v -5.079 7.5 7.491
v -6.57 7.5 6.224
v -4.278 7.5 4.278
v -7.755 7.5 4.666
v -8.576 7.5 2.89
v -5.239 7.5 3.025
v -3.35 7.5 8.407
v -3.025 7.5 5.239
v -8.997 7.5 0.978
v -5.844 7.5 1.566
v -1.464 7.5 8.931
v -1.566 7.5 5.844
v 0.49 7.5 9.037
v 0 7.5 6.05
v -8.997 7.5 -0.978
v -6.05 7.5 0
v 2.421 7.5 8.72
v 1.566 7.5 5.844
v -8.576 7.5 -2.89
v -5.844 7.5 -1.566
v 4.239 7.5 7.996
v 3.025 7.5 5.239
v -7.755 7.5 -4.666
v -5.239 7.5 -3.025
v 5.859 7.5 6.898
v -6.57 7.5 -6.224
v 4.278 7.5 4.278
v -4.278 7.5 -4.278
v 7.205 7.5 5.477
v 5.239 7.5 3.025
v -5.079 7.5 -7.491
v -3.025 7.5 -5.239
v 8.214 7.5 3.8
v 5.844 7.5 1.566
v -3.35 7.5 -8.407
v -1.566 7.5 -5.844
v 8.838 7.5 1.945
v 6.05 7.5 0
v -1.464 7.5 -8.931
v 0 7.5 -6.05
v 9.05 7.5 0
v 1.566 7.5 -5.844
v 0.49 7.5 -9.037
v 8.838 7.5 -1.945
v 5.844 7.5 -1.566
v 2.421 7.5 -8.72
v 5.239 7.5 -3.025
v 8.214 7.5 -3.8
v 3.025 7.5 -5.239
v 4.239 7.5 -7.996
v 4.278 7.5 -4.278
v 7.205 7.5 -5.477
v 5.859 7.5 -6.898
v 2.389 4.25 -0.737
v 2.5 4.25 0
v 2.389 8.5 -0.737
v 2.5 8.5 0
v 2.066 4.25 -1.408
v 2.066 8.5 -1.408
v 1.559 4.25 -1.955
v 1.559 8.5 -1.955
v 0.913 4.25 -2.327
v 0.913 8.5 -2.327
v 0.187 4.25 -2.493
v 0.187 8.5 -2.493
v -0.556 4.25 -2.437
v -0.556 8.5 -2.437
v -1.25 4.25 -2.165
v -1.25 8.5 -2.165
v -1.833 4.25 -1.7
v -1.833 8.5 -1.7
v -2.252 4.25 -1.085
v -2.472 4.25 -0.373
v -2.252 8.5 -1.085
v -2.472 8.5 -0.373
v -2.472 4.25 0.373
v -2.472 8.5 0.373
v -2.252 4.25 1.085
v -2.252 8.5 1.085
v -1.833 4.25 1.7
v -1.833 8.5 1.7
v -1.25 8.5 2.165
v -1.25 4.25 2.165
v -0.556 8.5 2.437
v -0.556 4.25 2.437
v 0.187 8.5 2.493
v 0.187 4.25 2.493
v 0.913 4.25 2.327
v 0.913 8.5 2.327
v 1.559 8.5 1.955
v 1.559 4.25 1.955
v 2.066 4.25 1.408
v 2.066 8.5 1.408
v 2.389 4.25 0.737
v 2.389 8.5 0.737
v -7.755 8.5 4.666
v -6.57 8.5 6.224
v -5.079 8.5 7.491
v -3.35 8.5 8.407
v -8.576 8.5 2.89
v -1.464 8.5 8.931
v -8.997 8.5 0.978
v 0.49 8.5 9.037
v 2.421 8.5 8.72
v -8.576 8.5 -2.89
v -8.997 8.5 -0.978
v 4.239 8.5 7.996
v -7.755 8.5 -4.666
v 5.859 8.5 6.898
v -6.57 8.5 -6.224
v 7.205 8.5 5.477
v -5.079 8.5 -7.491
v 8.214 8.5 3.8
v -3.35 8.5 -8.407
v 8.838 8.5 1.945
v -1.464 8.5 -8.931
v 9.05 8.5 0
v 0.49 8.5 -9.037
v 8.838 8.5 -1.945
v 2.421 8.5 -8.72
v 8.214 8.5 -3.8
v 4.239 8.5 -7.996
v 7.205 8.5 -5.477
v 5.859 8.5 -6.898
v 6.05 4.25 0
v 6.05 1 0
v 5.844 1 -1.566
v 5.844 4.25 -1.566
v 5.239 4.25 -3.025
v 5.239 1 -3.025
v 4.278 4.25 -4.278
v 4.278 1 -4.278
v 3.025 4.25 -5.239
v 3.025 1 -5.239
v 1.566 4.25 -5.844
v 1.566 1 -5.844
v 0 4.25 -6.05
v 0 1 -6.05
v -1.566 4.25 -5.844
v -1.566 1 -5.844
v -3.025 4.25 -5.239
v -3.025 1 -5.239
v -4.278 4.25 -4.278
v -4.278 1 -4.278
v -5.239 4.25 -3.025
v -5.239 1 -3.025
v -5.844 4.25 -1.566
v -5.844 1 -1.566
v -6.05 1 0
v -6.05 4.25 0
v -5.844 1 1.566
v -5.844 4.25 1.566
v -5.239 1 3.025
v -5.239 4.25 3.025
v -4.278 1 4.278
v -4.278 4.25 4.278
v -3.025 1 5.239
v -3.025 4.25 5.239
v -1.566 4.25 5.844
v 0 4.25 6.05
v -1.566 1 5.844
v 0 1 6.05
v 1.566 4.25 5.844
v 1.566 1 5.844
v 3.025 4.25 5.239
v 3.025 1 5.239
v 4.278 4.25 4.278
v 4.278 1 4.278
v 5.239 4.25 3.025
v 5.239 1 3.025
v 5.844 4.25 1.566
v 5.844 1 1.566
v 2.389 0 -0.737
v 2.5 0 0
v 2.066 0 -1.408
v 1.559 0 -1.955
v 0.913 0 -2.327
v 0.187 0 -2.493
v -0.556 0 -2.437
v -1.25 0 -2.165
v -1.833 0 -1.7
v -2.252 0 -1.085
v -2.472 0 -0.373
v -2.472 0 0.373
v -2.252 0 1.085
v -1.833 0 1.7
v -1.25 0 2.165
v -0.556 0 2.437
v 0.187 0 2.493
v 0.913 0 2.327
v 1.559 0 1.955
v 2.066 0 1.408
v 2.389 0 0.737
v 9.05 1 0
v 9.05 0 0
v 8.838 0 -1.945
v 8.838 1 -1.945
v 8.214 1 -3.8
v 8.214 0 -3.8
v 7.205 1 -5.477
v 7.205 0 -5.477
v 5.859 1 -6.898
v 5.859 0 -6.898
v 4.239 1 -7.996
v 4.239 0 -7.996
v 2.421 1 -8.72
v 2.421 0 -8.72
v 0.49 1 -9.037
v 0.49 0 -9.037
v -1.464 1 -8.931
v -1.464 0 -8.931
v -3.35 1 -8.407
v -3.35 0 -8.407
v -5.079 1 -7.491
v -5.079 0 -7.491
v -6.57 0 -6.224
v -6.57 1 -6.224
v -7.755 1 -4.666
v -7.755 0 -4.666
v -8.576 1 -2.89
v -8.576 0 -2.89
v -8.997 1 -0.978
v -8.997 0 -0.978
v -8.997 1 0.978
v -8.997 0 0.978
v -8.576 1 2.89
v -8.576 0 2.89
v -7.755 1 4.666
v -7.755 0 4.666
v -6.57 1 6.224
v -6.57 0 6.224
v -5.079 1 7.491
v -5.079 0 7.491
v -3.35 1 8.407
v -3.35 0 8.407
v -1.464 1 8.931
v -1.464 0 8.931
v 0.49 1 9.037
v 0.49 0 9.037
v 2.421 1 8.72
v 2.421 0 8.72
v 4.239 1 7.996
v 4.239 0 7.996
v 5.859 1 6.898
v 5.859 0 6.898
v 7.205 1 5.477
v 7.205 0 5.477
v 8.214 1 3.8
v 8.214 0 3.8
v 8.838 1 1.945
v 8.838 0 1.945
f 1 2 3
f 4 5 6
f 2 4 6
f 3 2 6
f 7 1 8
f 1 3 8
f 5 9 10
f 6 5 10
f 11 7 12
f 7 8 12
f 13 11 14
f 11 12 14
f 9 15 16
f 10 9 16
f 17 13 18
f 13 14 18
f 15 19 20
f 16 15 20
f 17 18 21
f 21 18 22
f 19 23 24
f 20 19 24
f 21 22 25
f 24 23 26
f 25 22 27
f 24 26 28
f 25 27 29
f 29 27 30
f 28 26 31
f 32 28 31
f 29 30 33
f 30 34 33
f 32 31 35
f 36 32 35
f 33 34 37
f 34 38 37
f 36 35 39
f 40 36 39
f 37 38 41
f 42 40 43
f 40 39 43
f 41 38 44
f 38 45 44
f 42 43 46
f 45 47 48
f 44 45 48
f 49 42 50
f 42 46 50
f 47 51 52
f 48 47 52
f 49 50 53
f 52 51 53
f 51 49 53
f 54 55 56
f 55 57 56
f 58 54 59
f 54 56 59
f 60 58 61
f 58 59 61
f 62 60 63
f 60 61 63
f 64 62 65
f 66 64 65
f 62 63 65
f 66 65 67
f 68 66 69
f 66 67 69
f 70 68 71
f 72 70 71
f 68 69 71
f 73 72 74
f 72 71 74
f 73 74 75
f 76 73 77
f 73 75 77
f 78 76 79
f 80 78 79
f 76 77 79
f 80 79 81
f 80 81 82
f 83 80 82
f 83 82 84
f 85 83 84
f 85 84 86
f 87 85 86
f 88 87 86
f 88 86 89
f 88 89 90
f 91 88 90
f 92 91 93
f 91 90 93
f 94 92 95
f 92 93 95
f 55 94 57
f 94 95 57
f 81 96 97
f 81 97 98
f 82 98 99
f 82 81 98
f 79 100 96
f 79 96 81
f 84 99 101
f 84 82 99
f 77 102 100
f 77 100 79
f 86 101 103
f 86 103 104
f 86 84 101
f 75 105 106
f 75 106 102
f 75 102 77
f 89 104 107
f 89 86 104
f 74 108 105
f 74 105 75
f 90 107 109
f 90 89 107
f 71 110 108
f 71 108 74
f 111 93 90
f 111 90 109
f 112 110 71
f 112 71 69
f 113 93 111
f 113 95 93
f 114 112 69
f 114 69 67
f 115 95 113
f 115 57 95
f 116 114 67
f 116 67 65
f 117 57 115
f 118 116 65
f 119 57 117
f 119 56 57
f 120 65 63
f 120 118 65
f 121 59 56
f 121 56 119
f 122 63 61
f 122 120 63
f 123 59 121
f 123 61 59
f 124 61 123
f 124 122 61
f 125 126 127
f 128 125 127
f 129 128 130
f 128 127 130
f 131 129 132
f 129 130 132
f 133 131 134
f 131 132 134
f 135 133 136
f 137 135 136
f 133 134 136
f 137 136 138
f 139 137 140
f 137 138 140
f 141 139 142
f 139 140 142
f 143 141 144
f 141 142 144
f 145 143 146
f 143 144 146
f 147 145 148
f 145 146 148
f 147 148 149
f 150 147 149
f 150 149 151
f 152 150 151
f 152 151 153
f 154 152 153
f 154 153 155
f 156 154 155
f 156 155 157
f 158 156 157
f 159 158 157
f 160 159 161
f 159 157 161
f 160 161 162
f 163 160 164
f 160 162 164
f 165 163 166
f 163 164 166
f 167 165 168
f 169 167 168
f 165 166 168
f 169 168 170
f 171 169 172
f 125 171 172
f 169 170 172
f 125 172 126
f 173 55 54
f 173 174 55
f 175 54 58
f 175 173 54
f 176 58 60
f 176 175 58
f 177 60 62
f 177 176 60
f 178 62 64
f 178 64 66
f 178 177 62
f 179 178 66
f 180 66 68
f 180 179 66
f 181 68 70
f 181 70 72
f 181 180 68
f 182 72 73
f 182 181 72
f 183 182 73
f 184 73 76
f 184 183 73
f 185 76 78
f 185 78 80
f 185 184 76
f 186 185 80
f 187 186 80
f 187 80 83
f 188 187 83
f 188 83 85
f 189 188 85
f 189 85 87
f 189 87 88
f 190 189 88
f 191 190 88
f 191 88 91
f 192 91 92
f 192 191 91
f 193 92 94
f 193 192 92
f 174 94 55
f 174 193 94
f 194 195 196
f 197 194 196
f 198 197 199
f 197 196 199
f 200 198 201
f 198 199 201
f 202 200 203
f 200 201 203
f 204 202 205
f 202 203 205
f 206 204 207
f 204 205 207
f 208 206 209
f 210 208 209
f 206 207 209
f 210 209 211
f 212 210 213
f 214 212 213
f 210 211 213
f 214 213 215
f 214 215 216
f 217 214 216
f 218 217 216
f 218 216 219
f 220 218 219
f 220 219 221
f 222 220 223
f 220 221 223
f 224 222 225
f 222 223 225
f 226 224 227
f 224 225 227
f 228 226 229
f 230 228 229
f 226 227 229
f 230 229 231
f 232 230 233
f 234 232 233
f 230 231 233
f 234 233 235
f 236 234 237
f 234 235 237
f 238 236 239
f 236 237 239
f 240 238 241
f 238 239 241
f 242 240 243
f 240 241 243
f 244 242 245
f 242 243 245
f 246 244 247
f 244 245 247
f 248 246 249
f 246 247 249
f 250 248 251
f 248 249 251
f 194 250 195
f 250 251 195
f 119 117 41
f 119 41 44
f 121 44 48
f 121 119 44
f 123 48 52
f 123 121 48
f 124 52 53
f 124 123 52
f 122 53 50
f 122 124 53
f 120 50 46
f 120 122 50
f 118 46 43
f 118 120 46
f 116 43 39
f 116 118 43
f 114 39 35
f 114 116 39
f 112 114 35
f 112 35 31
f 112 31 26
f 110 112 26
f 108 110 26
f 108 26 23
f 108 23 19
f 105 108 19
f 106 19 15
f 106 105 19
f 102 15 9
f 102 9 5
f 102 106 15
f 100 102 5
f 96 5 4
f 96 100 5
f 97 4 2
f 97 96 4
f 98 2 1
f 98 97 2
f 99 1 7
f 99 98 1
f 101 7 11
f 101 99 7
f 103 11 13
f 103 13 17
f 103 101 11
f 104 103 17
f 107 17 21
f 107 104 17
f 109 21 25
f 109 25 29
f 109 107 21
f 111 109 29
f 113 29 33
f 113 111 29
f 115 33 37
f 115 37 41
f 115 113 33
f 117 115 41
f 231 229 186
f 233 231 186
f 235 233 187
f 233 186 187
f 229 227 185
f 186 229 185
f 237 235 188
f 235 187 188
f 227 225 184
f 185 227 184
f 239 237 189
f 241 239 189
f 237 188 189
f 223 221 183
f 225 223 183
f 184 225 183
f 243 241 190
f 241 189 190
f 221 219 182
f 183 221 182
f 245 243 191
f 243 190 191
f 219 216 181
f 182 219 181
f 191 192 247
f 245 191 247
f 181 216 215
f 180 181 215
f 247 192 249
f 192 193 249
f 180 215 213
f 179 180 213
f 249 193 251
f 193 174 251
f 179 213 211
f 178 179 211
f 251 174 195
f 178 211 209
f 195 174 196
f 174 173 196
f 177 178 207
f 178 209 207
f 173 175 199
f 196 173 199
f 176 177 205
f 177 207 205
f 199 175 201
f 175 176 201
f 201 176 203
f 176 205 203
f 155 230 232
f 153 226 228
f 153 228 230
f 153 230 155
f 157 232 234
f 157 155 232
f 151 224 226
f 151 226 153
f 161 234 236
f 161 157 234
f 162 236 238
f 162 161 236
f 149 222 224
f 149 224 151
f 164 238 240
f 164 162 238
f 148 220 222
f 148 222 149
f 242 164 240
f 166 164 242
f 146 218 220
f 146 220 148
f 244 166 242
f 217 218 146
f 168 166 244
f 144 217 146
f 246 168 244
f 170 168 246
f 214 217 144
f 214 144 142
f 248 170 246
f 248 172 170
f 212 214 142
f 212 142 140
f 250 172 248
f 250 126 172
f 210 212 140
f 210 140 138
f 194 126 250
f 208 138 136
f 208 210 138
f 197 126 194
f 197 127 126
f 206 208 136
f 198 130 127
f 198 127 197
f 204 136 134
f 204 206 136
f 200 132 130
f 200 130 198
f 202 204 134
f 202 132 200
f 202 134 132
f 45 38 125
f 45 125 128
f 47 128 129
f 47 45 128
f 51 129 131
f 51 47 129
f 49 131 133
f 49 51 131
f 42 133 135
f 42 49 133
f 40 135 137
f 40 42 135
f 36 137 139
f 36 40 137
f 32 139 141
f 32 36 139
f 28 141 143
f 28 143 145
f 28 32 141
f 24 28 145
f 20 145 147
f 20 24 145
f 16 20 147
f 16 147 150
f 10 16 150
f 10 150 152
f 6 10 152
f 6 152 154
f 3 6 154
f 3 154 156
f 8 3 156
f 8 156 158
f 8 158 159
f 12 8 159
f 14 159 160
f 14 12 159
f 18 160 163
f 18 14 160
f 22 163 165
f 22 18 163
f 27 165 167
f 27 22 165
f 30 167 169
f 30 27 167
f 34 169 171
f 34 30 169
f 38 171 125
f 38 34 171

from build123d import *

# Parameters (mm, degrees)
SKETCH1_R           = 9.05
SKETCH1_R_2         = 6.05
SKETCH1_R_3         = 2.5
BOSS_EXTRUDE1_DEPTH = 1
BOSS_EXTRUDE2_START = 1
SKETCH1_3_R         = 6.05
SKETCH1_3_R_2       = 2.5
BOSS_EXTRUDE2_DEPTH = 3.25


with BuildPart() as part:
    # Sketch1 → Boss-Extrude1 (new body)
    with BuildSketch(Plane(origin=(0, 0, 0), x_dir=(1, 0, 0), z_dir=(0, 1, 0))):
        Circle(SKETCH1_R)
        Circle(SKETCH1_R_2, mode=Mode.SUBTRACT)
        Circle(SKETCH1_R_2)
        Circle(SKETCH1_R_3, mode=Mode.SUBTRACT)
    extrude(amount=BOSS_EXTRUDE1_DEPTH)

    # Sketch1<3> → Boss-Extrude2 (add)
    with BuildSketch(Plane(origin=(0, 0, 0), x_dir=(1, 0, 0), z_dir=(0, 1, 0)).offset(BOSS_EXTRUDE2_START)):
        Circle(SKETCH1_3_R)
        Circle(SKETCH1_3_R_2, mode=Mode.SUBTRACT)
    extrude(amount=BOSS_EXTRUDE2_DEPTH)

    # Mirror2: part across plane


with BuildPart() as part_1:
    add(part.part)
    add(part.part.mirror(Plane.ZX.offset(4.25)))


solid = part_1.part
